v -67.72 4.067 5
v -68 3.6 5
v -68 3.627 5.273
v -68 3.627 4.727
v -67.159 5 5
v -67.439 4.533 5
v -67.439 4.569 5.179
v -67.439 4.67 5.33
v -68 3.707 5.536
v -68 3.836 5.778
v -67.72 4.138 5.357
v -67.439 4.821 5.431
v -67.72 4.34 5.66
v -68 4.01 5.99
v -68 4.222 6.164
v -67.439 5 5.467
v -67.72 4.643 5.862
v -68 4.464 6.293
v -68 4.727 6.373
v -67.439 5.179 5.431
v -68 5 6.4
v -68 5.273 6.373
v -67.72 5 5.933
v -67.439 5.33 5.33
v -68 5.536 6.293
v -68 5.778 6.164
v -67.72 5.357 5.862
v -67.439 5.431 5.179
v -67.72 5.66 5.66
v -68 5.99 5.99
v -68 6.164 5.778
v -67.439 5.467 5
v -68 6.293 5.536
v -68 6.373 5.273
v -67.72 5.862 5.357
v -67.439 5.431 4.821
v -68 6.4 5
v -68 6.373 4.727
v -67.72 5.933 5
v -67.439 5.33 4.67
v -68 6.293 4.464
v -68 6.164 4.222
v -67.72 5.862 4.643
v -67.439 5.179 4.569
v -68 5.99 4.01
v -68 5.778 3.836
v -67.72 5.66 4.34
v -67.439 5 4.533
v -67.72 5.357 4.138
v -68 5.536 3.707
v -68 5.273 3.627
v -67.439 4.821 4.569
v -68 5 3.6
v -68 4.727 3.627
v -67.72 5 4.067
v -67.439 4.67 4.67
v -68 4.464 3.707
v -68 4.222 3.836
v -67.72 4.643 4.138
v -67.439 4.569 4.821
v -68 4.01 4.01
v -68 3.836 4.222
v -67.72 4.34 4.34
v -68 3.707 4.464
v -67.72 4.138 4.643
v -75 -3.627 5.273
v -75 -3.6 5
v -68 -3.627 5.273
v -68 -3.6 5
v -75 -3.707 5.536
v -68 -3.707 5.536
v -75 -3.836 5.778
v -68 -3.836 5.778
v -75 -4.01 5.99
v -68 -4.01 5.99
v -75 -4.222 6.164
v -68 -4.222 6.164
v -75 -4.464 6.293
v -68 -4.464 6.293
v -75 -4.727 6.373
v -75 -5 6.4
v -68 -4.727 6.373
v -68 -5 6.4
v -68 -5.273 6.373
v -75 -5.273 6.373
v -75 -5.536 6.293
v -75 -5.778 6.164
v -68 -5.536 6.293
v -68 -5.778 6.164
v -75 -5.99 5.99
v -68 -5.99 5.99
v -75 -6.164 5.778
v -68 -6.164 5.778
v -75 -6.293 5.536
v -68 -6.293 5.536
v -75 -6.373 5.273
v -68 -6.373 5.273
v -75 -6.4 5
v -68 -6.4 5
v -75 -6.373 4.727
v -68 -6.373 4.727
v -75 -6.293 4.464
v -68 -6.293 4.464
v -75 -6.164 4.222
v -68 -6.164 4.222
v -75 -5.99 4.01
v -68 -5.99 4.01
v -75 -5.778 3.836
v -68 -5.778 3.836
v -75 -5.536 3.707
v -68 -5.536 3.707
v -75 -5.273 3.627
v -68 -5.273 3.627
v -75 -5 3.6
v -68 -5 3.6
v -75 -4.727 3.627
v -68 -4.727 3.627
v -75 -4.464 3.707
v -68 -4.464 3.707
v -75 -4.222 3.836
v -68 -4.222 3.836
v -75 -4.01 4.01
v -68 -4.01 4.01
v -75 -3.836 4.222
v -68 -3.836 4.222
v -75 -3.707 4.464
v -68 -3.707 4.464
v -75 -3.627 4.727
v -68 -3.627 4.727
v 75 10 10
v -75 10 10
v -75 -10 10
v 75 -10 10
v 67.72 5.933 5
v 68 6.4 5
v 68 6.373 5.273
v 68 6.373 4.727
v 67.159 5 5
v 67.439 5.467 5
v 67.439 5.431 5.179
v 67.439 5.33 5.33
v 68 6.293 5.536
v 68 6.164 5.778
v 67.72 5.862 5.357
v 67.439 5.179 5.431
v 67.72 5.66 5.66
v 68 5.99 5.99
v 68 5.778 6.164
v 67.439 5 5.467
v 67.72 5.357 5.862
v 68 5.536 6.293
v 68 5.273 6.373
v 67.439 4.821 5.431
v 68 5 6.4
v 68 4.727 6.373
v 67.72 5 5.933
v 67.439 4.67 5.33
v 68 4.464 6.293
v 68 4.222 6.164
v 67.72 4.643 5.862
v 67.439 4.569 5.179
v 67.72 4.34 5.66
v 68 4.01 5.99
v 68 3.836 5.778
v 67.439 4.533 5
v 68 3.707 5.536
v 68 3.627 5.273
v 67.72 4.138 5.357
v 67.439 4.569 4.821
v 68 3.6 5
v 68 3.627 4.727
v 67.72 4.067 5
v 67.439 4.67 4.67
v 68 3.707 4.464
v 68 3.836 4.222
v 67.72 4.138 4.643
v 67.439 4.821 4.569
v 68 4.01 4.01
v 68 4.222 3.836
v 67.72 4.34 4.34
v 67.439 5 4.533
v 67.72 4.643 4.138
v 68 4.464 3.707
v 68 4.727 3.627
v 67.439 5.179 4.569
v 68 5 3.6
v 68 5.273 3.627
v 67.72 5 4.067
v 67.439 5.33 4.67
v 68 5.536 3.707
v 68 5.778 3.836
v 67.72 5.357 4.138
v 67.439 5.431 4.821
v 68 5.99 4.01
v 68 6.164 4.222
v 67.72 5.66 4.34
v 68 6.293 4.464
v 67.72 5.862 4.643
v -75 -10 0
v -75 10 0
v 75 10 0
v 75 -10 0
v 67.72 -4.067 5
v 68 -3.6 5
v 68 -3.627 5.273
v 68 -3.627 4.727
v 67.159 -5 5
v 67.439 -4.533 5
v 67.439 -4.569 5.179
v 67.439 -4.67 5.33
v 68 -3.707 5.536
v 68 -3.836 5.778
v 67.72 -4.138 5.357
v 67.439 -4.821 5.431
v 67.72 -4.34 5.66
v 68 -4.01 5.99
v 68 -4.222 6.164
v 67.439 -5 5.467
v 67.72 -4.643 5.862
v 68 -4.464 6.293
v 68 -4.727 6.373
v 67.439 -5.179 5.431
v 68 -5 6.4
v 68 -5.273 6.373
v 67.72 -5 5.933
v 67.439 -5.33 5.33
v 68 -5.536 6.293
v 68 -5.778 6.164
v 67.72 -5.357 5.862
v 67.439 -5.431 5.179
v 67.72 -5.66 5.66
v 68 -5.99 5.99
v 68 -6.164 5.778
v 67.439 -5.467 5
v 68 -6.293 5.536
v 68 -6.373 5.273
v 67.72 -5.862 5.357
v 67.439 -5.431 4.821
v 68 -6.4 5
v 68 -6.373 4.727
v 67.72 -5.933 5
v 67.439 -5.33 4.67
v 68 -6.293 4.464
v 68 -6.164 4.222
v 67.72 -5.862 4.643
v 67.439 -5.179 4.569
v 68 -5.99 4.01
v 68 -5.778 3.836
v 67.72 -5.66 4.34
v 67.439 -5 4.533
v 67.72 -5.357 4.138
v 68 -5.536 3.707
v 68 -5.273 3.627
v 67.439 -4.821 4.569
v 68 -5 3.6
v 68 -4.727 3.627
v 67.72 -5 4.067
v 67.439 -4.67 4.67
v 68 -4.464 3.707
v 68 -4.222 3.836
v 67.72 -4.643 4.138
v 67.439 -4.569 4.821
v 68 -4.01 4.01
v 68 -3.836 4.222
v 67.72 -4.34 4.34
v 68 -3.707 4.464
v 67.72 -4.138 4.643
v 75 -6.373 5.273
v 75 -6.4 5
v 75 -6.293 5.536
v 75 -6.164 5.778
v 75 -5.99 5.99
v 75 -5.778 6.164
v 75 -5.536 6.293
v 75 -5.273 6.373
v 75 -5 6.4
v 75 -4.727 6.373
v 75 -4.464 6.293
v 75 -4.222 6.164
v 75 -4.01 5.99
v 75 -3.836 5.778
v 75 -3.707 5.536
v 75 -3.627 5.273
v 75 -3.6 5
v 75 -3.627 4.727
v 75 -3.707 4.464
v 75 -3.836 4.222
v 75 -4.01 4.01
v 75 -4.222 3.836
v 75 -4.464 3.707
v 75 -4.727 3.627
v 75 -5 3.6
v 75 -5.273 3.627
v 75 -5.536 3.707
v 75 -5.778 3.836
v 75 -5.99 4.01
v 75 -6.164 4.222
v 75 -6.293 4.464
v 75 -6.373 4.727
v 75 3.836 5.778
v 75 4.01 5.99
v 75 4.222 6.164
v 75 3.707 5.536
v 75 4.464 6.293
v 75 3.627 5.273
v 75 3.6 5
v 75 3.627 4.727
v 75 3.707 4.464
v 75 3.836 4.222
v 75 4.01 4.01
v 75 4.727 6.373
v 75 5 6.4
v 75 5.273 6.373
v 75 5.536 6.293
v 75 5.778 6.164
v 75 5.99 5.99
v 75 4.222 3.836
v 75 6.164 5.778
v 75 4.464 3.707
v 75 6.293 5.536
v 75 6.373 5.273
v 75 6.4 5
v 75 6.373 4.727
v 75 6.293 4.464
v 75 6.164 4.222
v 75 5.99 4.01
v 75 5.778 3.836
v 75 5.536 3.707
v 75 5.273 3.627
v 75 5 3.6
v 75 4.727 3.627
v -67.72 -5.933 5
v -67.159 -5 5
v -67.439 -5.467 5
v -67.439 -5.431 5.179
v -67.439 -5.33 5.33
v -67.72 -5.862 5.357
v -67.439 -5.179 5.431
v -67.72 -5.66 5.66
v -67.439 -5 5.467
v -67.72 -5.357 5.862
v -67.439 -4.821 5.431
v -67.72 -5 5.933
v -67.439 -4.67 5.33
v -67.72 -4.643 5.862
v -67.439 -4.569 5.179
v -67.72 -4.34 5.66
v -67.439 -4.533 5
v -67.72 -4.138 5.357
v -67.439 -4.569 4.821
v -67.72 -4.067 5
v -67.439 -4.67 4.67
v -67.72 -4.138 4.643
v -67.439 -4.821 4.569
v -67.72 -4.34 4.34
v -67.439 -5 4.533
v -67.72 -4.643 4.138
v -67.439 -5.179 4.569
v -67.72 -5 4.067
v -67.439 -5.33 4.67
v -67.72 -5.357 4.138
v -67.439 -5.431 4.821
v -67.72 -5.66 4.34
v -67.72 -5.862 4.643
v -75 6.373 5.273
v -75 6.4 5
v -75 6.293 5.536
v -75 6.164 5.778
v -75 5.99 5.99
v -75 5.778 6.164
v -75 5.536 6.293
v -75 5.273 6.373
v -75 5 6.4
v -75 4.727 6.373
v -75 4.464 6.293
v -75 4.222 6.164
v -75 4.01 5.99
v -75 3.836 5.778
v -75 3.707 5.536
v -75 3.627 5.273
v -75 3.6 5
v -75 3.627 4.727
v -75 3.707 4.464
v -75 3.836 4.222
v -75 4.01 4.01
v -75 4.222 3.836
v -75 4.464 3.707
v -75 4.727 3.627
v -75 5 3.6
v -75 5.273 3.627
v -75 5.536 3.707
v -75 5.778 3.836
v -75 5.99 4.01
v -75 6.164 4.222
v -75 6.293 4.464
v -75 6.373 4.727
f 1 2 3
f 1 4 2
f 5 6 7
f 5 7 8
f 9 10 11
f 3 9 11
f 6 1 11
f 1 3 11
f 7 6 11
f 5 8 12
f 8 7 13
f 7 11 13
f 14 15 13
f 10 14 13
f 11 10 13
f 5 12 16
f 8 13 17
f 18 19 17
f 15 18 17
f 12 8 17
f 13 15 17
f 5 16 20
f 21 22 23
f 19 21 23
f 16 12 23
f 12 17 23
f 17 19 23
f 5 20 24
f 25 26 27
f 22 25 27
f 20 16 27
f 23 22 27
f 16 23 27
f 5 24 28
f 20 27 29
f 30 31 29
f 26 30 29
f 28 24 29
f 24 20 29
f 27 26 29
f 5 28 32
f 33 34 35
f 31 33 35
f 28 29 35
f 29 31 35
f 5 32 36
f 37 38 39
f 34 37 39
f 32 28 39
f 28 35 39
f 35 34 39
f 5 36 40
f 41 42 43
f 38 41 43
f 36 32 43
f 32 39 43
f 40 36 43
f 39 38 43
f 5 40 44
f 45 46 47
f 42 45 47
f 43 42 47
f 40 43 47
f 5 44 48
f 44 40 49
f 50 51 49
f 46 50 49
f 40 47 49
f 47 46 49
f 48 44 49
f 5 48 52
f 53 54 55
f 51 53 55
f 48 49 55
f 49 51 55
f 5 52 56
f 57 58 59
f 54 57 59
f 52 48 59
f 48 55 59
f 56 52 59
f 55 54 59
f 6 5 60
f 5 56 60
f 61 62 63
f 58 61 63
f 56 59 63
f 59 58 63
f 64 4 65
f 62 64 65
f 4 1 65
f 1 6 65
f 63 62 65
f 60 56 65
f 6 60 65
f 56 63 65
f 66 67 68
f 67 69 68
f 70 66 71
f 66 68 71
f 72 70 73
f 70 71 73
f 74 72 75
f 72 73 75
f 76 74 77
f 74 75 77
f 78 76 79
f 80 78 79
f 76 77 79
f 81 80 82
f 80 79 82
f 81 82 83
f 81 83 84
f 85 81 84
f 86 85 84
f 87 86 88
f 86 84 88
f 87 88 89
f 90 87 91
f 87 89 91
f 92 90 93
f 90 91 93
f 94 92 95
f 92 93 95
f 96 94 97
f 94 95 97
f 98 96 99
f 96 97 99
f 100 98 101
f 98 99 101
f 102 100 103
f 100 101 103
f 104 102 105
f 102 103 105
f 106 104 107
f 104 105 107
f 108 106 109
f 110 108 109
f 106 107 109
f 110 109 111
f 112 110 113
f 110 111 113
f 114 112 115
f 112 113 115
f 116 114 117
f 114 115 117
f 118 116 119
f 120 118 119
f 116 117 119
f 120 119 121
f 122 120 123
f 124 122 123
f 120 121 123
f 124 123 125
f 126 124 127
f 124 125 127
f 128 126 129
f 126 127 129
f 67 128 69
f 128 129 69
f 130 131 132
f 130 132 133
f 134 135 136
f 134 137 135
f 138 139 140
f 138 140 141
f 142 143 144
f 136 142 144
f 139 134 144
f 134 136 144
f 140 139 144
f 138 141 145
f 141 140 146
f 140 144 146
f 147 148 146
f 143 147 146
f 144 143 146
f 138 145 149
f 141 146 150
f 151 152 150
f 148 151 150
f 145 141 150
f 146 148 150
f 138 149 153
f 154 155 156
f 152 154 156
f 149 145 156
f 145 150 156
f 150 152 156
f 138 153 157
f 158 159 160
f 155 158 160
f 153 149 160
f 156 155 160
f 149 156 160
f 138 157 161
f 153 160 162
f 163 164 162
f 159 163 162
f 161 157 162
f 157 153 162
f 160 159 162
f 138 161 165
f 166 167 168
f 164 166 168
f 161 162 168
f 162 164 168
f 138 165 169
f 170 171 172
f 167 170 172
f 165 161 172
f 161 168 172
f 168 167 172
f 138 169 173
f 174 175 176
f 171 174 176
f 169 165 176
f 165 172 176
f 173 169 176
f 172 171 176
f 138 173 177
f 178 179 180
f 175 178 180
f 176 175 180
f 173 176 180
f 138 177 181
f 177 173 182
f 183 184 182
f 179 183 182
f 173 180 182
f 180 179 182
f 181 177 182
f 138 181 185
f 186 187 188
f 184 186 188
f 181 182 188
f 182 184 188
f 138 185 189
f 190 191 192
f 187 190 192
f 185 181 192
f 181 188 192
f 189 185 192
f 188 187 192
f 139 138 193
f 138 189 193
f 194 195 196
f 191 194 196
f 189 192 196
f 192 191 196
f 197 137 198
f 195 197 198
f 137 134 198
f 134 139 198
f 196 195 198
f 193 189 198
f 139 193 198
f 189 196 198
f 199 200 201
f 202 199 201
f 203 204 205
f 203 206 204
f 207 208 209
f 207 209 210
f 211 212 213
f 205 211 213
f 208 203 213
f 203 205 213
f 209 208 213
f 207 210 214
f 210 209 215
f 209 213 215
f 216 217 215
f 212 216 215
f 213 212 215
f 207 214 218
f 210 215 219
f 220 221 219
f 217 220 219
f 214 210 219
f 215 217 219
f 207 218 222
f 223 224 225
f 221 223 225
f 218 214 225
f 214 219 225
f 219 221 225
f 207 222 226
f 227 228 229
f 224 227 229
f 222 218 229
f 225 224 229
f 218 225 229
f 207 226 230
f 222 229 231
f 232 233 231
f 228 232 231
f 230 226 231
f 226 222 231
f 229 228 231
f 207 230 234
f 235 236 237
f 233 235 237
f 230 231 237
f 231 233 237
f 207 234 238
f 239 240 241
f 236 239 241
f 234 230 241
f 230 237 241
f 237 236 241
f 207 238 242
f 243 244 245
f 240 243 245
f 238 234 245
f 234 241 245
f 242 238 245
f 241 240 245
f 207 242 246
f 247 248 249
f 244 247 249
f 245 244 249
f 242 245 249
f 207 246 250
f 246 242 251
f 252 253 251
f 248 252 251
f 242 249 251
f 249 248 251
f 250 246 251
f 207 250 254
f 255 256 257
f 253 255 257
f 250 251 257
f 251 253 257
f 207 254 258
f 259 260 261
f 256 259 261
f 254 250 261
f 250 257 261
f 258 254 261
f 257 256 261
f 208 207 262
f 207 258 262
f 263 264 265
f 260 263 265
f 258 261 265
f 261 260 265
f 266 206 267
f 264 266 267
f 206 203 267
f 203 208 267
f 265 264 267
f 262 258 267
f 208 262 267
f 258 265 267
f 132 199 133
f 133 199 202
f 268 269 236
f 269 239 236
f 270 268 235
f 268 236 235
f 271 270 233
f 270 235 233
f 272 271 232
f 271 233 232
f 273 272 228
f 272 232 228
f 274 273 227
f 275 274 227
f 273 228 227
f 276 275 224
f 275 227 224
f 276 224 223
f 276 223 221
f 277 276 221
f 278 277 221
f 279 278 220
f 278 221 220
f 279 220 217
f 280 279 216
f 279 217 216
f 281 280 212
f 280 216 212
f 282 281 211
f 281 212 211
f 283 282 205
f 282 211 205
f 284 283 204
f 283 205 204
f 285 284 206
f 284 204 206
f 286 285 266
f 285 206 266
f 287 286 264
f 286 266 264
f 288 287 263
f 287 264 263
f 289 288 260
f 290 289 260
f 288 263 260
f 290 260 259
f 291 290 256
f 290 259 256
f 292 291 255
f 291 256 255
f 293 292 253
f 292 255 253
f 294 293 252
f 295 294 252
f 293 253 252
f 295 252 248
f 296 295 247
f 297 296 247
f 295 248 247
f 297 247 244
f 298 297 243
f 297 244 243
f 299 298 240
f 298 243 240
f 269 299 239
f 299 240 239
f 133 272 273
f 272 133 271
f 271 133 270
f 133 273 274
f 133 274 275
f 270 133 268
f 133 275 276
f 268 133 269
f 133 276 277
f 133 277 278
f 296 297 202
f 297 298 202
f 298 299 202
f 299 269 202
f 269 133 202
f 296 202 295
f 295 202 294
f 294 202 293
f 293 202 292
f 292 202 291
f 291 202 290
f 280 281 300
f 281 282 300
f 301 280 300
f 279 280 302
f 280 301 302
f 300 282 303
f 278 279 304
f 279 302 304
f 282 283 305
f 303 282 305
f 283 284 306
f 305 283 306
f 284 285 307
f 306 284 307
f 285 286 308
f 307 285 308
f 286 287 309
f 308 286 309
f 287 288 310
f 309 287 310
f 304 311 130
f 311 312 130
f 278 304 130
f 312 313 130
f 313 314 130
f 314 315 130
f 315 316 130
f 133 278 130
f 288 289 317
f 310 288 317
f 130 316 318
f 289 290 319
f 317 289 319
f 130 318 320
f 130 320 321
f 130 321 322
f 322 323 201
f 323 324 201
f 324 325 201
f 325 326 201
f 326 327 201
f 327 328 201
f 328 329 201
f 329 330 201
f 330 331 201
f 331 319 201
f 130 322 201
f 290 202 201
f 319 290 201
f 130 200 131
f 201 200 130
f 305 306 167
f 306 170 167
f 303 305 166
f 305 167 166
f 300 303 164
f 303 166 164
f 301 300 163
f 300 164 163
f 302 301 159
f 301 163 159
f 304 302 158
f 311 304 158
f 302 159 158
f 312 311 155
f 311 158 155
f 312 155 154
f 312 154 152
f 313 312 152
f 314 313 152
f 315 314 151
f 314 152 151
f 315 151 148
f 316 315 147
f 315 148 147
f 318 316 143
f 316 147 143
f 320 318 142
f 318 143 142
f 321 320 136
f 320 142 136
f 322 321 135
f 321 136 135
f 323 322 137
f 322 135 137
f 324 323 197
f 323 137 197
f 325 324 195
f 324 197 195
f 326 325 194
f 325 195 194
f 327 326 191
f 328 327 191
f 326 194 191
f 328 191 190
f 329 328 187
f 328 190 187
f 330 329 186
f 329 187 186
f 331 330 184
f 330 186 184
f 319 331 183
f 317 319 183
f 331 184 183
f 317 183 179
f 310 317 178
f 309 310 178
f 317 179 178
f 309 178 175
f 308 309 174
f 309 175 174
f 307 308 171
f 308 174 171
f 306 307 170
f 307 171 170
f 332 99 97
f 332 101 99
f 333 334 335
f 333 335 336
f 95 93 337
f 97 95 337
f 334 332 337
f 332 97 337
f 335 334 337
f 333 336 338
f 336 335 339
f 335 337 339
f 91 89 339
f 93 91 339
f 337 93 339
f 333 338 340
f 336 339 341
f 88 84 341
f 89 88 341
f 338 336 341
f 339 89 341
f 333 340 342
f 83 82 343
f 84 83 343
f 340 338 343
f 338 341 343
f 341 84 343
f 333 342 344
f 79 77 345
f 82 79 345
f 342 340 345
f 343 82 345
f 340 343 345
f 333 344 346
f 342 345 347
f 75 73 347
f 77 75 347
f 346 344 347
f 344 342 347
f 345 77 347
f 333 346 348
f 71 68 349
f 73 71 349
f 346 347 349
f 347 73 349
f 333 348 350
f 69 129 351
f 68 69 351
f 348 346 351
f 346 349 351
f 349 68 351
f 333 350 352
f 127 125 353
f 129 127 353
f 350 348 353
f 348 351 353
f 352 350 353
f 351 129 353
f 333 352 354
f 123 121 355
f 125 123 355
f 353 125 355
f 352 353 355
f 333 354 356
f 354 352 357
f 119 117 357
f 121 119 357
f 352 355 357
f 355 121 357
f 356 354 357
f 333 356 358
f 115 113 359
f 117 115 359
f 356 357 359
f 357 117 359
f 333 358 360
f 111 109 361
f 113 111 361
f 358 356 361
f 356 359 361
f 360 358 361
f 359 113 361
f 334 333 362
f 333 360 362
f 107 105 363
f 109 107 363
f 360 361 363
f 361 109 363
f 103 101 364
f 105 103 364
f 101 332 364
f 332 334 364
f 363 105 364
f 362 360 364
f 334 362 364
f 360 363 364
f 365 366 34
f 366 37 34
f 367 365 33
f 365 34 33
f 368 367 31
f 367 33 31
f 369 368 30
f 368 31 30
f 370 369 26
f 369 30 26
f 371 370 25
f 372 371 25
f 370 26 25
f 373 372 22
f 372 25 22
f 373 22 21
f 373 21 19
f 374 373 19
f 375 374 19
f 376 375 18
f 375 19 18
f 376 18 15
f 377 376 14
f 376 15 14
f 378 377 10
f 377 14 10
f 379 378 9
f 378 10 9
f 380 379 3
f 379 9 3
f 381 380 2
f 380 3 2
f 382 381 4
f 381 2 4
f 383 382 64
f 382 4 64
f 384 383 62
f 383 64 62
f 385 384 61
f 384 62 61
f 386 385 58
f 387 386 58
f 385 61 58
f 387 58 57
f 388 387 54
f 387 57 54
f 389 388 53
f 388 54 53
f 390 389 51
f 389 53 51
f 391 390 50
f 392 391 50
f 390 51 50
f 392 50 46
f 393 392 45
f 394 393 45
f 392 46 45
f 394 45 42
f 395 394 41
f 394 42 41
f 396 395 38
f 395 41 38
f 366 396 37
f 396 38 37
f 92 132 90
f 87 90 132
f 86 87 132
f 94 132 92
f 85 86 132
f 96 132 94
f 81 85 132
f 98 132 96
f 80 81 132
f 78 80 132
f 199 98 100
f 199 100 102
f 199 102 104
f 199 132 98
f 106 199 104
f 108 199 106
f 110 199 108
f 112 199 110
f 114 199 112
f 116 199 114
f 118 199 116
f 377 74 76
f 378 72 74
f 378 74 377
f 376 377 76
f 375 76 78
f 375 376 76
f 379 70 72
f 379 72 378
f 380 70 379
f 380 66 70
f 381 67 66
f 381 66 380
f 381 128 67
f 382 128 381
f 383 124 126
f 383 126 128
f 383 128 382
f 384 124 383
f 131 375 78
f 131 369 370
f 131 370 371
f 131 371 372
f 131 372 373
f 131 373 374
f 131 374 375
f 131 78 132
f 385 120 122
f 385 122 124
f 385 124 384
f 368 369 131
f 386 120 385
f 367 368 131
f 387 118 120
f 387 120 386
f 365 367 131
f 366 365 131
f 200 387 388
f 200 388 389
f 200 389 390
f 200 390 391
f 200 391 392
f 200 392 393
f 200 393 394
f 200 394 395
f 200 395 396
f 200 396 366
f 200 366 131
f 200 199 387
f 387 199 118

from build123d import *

# Parameters (mm, degrees)
F0_W     = 150
F0_H     = 20
F1_DEPTH = 10
F3_D     = 2.8
F3_DEPTH = 7
F3_TIP   = 0.8412048666
F5_D     = 2.8
F5_DEPTH = 7
F5_TIP   = 0.8412048666


with BuildPart() as f1:
    # F0 (on Top) → F1 (new body)
    with BuildSketch(Plane.XY):
        Rectangle(F0_W, F0_H)
    extrude(amount=F1_DEPTH)

    # F3
    with Locations(Plane(origin=(-75, 0, 0), x_dir=(0, -1, 0), z_dir=(-1, 0, 0))):
        with Locations((-5, 5), (5, 5)):
            Hole(F3_D / 2, depth=F3_DEPTH)
            with Locations((0, 0, -(F3_DEPTH + F3_TIP / 2))):  # 118° drill point
                Cone(0, F3_D / 2, F3_TIP, mode=Mode.SUBTRACT)

    # F5
    with Locations(Plane.YZ.offset(75)):
        with Locations((-5, 5), (5, 5)):
            Hole(F5_D / 2, depth=F5_DEPTH)
            with Locations((0, 0, -(F5_DEPTH + F5_TIP / 2))):  # 118° drill point
                Cone(0, F5_D / 2, F5_TIP, mode=Mode.SUBTRACT)


solid = f1.part
